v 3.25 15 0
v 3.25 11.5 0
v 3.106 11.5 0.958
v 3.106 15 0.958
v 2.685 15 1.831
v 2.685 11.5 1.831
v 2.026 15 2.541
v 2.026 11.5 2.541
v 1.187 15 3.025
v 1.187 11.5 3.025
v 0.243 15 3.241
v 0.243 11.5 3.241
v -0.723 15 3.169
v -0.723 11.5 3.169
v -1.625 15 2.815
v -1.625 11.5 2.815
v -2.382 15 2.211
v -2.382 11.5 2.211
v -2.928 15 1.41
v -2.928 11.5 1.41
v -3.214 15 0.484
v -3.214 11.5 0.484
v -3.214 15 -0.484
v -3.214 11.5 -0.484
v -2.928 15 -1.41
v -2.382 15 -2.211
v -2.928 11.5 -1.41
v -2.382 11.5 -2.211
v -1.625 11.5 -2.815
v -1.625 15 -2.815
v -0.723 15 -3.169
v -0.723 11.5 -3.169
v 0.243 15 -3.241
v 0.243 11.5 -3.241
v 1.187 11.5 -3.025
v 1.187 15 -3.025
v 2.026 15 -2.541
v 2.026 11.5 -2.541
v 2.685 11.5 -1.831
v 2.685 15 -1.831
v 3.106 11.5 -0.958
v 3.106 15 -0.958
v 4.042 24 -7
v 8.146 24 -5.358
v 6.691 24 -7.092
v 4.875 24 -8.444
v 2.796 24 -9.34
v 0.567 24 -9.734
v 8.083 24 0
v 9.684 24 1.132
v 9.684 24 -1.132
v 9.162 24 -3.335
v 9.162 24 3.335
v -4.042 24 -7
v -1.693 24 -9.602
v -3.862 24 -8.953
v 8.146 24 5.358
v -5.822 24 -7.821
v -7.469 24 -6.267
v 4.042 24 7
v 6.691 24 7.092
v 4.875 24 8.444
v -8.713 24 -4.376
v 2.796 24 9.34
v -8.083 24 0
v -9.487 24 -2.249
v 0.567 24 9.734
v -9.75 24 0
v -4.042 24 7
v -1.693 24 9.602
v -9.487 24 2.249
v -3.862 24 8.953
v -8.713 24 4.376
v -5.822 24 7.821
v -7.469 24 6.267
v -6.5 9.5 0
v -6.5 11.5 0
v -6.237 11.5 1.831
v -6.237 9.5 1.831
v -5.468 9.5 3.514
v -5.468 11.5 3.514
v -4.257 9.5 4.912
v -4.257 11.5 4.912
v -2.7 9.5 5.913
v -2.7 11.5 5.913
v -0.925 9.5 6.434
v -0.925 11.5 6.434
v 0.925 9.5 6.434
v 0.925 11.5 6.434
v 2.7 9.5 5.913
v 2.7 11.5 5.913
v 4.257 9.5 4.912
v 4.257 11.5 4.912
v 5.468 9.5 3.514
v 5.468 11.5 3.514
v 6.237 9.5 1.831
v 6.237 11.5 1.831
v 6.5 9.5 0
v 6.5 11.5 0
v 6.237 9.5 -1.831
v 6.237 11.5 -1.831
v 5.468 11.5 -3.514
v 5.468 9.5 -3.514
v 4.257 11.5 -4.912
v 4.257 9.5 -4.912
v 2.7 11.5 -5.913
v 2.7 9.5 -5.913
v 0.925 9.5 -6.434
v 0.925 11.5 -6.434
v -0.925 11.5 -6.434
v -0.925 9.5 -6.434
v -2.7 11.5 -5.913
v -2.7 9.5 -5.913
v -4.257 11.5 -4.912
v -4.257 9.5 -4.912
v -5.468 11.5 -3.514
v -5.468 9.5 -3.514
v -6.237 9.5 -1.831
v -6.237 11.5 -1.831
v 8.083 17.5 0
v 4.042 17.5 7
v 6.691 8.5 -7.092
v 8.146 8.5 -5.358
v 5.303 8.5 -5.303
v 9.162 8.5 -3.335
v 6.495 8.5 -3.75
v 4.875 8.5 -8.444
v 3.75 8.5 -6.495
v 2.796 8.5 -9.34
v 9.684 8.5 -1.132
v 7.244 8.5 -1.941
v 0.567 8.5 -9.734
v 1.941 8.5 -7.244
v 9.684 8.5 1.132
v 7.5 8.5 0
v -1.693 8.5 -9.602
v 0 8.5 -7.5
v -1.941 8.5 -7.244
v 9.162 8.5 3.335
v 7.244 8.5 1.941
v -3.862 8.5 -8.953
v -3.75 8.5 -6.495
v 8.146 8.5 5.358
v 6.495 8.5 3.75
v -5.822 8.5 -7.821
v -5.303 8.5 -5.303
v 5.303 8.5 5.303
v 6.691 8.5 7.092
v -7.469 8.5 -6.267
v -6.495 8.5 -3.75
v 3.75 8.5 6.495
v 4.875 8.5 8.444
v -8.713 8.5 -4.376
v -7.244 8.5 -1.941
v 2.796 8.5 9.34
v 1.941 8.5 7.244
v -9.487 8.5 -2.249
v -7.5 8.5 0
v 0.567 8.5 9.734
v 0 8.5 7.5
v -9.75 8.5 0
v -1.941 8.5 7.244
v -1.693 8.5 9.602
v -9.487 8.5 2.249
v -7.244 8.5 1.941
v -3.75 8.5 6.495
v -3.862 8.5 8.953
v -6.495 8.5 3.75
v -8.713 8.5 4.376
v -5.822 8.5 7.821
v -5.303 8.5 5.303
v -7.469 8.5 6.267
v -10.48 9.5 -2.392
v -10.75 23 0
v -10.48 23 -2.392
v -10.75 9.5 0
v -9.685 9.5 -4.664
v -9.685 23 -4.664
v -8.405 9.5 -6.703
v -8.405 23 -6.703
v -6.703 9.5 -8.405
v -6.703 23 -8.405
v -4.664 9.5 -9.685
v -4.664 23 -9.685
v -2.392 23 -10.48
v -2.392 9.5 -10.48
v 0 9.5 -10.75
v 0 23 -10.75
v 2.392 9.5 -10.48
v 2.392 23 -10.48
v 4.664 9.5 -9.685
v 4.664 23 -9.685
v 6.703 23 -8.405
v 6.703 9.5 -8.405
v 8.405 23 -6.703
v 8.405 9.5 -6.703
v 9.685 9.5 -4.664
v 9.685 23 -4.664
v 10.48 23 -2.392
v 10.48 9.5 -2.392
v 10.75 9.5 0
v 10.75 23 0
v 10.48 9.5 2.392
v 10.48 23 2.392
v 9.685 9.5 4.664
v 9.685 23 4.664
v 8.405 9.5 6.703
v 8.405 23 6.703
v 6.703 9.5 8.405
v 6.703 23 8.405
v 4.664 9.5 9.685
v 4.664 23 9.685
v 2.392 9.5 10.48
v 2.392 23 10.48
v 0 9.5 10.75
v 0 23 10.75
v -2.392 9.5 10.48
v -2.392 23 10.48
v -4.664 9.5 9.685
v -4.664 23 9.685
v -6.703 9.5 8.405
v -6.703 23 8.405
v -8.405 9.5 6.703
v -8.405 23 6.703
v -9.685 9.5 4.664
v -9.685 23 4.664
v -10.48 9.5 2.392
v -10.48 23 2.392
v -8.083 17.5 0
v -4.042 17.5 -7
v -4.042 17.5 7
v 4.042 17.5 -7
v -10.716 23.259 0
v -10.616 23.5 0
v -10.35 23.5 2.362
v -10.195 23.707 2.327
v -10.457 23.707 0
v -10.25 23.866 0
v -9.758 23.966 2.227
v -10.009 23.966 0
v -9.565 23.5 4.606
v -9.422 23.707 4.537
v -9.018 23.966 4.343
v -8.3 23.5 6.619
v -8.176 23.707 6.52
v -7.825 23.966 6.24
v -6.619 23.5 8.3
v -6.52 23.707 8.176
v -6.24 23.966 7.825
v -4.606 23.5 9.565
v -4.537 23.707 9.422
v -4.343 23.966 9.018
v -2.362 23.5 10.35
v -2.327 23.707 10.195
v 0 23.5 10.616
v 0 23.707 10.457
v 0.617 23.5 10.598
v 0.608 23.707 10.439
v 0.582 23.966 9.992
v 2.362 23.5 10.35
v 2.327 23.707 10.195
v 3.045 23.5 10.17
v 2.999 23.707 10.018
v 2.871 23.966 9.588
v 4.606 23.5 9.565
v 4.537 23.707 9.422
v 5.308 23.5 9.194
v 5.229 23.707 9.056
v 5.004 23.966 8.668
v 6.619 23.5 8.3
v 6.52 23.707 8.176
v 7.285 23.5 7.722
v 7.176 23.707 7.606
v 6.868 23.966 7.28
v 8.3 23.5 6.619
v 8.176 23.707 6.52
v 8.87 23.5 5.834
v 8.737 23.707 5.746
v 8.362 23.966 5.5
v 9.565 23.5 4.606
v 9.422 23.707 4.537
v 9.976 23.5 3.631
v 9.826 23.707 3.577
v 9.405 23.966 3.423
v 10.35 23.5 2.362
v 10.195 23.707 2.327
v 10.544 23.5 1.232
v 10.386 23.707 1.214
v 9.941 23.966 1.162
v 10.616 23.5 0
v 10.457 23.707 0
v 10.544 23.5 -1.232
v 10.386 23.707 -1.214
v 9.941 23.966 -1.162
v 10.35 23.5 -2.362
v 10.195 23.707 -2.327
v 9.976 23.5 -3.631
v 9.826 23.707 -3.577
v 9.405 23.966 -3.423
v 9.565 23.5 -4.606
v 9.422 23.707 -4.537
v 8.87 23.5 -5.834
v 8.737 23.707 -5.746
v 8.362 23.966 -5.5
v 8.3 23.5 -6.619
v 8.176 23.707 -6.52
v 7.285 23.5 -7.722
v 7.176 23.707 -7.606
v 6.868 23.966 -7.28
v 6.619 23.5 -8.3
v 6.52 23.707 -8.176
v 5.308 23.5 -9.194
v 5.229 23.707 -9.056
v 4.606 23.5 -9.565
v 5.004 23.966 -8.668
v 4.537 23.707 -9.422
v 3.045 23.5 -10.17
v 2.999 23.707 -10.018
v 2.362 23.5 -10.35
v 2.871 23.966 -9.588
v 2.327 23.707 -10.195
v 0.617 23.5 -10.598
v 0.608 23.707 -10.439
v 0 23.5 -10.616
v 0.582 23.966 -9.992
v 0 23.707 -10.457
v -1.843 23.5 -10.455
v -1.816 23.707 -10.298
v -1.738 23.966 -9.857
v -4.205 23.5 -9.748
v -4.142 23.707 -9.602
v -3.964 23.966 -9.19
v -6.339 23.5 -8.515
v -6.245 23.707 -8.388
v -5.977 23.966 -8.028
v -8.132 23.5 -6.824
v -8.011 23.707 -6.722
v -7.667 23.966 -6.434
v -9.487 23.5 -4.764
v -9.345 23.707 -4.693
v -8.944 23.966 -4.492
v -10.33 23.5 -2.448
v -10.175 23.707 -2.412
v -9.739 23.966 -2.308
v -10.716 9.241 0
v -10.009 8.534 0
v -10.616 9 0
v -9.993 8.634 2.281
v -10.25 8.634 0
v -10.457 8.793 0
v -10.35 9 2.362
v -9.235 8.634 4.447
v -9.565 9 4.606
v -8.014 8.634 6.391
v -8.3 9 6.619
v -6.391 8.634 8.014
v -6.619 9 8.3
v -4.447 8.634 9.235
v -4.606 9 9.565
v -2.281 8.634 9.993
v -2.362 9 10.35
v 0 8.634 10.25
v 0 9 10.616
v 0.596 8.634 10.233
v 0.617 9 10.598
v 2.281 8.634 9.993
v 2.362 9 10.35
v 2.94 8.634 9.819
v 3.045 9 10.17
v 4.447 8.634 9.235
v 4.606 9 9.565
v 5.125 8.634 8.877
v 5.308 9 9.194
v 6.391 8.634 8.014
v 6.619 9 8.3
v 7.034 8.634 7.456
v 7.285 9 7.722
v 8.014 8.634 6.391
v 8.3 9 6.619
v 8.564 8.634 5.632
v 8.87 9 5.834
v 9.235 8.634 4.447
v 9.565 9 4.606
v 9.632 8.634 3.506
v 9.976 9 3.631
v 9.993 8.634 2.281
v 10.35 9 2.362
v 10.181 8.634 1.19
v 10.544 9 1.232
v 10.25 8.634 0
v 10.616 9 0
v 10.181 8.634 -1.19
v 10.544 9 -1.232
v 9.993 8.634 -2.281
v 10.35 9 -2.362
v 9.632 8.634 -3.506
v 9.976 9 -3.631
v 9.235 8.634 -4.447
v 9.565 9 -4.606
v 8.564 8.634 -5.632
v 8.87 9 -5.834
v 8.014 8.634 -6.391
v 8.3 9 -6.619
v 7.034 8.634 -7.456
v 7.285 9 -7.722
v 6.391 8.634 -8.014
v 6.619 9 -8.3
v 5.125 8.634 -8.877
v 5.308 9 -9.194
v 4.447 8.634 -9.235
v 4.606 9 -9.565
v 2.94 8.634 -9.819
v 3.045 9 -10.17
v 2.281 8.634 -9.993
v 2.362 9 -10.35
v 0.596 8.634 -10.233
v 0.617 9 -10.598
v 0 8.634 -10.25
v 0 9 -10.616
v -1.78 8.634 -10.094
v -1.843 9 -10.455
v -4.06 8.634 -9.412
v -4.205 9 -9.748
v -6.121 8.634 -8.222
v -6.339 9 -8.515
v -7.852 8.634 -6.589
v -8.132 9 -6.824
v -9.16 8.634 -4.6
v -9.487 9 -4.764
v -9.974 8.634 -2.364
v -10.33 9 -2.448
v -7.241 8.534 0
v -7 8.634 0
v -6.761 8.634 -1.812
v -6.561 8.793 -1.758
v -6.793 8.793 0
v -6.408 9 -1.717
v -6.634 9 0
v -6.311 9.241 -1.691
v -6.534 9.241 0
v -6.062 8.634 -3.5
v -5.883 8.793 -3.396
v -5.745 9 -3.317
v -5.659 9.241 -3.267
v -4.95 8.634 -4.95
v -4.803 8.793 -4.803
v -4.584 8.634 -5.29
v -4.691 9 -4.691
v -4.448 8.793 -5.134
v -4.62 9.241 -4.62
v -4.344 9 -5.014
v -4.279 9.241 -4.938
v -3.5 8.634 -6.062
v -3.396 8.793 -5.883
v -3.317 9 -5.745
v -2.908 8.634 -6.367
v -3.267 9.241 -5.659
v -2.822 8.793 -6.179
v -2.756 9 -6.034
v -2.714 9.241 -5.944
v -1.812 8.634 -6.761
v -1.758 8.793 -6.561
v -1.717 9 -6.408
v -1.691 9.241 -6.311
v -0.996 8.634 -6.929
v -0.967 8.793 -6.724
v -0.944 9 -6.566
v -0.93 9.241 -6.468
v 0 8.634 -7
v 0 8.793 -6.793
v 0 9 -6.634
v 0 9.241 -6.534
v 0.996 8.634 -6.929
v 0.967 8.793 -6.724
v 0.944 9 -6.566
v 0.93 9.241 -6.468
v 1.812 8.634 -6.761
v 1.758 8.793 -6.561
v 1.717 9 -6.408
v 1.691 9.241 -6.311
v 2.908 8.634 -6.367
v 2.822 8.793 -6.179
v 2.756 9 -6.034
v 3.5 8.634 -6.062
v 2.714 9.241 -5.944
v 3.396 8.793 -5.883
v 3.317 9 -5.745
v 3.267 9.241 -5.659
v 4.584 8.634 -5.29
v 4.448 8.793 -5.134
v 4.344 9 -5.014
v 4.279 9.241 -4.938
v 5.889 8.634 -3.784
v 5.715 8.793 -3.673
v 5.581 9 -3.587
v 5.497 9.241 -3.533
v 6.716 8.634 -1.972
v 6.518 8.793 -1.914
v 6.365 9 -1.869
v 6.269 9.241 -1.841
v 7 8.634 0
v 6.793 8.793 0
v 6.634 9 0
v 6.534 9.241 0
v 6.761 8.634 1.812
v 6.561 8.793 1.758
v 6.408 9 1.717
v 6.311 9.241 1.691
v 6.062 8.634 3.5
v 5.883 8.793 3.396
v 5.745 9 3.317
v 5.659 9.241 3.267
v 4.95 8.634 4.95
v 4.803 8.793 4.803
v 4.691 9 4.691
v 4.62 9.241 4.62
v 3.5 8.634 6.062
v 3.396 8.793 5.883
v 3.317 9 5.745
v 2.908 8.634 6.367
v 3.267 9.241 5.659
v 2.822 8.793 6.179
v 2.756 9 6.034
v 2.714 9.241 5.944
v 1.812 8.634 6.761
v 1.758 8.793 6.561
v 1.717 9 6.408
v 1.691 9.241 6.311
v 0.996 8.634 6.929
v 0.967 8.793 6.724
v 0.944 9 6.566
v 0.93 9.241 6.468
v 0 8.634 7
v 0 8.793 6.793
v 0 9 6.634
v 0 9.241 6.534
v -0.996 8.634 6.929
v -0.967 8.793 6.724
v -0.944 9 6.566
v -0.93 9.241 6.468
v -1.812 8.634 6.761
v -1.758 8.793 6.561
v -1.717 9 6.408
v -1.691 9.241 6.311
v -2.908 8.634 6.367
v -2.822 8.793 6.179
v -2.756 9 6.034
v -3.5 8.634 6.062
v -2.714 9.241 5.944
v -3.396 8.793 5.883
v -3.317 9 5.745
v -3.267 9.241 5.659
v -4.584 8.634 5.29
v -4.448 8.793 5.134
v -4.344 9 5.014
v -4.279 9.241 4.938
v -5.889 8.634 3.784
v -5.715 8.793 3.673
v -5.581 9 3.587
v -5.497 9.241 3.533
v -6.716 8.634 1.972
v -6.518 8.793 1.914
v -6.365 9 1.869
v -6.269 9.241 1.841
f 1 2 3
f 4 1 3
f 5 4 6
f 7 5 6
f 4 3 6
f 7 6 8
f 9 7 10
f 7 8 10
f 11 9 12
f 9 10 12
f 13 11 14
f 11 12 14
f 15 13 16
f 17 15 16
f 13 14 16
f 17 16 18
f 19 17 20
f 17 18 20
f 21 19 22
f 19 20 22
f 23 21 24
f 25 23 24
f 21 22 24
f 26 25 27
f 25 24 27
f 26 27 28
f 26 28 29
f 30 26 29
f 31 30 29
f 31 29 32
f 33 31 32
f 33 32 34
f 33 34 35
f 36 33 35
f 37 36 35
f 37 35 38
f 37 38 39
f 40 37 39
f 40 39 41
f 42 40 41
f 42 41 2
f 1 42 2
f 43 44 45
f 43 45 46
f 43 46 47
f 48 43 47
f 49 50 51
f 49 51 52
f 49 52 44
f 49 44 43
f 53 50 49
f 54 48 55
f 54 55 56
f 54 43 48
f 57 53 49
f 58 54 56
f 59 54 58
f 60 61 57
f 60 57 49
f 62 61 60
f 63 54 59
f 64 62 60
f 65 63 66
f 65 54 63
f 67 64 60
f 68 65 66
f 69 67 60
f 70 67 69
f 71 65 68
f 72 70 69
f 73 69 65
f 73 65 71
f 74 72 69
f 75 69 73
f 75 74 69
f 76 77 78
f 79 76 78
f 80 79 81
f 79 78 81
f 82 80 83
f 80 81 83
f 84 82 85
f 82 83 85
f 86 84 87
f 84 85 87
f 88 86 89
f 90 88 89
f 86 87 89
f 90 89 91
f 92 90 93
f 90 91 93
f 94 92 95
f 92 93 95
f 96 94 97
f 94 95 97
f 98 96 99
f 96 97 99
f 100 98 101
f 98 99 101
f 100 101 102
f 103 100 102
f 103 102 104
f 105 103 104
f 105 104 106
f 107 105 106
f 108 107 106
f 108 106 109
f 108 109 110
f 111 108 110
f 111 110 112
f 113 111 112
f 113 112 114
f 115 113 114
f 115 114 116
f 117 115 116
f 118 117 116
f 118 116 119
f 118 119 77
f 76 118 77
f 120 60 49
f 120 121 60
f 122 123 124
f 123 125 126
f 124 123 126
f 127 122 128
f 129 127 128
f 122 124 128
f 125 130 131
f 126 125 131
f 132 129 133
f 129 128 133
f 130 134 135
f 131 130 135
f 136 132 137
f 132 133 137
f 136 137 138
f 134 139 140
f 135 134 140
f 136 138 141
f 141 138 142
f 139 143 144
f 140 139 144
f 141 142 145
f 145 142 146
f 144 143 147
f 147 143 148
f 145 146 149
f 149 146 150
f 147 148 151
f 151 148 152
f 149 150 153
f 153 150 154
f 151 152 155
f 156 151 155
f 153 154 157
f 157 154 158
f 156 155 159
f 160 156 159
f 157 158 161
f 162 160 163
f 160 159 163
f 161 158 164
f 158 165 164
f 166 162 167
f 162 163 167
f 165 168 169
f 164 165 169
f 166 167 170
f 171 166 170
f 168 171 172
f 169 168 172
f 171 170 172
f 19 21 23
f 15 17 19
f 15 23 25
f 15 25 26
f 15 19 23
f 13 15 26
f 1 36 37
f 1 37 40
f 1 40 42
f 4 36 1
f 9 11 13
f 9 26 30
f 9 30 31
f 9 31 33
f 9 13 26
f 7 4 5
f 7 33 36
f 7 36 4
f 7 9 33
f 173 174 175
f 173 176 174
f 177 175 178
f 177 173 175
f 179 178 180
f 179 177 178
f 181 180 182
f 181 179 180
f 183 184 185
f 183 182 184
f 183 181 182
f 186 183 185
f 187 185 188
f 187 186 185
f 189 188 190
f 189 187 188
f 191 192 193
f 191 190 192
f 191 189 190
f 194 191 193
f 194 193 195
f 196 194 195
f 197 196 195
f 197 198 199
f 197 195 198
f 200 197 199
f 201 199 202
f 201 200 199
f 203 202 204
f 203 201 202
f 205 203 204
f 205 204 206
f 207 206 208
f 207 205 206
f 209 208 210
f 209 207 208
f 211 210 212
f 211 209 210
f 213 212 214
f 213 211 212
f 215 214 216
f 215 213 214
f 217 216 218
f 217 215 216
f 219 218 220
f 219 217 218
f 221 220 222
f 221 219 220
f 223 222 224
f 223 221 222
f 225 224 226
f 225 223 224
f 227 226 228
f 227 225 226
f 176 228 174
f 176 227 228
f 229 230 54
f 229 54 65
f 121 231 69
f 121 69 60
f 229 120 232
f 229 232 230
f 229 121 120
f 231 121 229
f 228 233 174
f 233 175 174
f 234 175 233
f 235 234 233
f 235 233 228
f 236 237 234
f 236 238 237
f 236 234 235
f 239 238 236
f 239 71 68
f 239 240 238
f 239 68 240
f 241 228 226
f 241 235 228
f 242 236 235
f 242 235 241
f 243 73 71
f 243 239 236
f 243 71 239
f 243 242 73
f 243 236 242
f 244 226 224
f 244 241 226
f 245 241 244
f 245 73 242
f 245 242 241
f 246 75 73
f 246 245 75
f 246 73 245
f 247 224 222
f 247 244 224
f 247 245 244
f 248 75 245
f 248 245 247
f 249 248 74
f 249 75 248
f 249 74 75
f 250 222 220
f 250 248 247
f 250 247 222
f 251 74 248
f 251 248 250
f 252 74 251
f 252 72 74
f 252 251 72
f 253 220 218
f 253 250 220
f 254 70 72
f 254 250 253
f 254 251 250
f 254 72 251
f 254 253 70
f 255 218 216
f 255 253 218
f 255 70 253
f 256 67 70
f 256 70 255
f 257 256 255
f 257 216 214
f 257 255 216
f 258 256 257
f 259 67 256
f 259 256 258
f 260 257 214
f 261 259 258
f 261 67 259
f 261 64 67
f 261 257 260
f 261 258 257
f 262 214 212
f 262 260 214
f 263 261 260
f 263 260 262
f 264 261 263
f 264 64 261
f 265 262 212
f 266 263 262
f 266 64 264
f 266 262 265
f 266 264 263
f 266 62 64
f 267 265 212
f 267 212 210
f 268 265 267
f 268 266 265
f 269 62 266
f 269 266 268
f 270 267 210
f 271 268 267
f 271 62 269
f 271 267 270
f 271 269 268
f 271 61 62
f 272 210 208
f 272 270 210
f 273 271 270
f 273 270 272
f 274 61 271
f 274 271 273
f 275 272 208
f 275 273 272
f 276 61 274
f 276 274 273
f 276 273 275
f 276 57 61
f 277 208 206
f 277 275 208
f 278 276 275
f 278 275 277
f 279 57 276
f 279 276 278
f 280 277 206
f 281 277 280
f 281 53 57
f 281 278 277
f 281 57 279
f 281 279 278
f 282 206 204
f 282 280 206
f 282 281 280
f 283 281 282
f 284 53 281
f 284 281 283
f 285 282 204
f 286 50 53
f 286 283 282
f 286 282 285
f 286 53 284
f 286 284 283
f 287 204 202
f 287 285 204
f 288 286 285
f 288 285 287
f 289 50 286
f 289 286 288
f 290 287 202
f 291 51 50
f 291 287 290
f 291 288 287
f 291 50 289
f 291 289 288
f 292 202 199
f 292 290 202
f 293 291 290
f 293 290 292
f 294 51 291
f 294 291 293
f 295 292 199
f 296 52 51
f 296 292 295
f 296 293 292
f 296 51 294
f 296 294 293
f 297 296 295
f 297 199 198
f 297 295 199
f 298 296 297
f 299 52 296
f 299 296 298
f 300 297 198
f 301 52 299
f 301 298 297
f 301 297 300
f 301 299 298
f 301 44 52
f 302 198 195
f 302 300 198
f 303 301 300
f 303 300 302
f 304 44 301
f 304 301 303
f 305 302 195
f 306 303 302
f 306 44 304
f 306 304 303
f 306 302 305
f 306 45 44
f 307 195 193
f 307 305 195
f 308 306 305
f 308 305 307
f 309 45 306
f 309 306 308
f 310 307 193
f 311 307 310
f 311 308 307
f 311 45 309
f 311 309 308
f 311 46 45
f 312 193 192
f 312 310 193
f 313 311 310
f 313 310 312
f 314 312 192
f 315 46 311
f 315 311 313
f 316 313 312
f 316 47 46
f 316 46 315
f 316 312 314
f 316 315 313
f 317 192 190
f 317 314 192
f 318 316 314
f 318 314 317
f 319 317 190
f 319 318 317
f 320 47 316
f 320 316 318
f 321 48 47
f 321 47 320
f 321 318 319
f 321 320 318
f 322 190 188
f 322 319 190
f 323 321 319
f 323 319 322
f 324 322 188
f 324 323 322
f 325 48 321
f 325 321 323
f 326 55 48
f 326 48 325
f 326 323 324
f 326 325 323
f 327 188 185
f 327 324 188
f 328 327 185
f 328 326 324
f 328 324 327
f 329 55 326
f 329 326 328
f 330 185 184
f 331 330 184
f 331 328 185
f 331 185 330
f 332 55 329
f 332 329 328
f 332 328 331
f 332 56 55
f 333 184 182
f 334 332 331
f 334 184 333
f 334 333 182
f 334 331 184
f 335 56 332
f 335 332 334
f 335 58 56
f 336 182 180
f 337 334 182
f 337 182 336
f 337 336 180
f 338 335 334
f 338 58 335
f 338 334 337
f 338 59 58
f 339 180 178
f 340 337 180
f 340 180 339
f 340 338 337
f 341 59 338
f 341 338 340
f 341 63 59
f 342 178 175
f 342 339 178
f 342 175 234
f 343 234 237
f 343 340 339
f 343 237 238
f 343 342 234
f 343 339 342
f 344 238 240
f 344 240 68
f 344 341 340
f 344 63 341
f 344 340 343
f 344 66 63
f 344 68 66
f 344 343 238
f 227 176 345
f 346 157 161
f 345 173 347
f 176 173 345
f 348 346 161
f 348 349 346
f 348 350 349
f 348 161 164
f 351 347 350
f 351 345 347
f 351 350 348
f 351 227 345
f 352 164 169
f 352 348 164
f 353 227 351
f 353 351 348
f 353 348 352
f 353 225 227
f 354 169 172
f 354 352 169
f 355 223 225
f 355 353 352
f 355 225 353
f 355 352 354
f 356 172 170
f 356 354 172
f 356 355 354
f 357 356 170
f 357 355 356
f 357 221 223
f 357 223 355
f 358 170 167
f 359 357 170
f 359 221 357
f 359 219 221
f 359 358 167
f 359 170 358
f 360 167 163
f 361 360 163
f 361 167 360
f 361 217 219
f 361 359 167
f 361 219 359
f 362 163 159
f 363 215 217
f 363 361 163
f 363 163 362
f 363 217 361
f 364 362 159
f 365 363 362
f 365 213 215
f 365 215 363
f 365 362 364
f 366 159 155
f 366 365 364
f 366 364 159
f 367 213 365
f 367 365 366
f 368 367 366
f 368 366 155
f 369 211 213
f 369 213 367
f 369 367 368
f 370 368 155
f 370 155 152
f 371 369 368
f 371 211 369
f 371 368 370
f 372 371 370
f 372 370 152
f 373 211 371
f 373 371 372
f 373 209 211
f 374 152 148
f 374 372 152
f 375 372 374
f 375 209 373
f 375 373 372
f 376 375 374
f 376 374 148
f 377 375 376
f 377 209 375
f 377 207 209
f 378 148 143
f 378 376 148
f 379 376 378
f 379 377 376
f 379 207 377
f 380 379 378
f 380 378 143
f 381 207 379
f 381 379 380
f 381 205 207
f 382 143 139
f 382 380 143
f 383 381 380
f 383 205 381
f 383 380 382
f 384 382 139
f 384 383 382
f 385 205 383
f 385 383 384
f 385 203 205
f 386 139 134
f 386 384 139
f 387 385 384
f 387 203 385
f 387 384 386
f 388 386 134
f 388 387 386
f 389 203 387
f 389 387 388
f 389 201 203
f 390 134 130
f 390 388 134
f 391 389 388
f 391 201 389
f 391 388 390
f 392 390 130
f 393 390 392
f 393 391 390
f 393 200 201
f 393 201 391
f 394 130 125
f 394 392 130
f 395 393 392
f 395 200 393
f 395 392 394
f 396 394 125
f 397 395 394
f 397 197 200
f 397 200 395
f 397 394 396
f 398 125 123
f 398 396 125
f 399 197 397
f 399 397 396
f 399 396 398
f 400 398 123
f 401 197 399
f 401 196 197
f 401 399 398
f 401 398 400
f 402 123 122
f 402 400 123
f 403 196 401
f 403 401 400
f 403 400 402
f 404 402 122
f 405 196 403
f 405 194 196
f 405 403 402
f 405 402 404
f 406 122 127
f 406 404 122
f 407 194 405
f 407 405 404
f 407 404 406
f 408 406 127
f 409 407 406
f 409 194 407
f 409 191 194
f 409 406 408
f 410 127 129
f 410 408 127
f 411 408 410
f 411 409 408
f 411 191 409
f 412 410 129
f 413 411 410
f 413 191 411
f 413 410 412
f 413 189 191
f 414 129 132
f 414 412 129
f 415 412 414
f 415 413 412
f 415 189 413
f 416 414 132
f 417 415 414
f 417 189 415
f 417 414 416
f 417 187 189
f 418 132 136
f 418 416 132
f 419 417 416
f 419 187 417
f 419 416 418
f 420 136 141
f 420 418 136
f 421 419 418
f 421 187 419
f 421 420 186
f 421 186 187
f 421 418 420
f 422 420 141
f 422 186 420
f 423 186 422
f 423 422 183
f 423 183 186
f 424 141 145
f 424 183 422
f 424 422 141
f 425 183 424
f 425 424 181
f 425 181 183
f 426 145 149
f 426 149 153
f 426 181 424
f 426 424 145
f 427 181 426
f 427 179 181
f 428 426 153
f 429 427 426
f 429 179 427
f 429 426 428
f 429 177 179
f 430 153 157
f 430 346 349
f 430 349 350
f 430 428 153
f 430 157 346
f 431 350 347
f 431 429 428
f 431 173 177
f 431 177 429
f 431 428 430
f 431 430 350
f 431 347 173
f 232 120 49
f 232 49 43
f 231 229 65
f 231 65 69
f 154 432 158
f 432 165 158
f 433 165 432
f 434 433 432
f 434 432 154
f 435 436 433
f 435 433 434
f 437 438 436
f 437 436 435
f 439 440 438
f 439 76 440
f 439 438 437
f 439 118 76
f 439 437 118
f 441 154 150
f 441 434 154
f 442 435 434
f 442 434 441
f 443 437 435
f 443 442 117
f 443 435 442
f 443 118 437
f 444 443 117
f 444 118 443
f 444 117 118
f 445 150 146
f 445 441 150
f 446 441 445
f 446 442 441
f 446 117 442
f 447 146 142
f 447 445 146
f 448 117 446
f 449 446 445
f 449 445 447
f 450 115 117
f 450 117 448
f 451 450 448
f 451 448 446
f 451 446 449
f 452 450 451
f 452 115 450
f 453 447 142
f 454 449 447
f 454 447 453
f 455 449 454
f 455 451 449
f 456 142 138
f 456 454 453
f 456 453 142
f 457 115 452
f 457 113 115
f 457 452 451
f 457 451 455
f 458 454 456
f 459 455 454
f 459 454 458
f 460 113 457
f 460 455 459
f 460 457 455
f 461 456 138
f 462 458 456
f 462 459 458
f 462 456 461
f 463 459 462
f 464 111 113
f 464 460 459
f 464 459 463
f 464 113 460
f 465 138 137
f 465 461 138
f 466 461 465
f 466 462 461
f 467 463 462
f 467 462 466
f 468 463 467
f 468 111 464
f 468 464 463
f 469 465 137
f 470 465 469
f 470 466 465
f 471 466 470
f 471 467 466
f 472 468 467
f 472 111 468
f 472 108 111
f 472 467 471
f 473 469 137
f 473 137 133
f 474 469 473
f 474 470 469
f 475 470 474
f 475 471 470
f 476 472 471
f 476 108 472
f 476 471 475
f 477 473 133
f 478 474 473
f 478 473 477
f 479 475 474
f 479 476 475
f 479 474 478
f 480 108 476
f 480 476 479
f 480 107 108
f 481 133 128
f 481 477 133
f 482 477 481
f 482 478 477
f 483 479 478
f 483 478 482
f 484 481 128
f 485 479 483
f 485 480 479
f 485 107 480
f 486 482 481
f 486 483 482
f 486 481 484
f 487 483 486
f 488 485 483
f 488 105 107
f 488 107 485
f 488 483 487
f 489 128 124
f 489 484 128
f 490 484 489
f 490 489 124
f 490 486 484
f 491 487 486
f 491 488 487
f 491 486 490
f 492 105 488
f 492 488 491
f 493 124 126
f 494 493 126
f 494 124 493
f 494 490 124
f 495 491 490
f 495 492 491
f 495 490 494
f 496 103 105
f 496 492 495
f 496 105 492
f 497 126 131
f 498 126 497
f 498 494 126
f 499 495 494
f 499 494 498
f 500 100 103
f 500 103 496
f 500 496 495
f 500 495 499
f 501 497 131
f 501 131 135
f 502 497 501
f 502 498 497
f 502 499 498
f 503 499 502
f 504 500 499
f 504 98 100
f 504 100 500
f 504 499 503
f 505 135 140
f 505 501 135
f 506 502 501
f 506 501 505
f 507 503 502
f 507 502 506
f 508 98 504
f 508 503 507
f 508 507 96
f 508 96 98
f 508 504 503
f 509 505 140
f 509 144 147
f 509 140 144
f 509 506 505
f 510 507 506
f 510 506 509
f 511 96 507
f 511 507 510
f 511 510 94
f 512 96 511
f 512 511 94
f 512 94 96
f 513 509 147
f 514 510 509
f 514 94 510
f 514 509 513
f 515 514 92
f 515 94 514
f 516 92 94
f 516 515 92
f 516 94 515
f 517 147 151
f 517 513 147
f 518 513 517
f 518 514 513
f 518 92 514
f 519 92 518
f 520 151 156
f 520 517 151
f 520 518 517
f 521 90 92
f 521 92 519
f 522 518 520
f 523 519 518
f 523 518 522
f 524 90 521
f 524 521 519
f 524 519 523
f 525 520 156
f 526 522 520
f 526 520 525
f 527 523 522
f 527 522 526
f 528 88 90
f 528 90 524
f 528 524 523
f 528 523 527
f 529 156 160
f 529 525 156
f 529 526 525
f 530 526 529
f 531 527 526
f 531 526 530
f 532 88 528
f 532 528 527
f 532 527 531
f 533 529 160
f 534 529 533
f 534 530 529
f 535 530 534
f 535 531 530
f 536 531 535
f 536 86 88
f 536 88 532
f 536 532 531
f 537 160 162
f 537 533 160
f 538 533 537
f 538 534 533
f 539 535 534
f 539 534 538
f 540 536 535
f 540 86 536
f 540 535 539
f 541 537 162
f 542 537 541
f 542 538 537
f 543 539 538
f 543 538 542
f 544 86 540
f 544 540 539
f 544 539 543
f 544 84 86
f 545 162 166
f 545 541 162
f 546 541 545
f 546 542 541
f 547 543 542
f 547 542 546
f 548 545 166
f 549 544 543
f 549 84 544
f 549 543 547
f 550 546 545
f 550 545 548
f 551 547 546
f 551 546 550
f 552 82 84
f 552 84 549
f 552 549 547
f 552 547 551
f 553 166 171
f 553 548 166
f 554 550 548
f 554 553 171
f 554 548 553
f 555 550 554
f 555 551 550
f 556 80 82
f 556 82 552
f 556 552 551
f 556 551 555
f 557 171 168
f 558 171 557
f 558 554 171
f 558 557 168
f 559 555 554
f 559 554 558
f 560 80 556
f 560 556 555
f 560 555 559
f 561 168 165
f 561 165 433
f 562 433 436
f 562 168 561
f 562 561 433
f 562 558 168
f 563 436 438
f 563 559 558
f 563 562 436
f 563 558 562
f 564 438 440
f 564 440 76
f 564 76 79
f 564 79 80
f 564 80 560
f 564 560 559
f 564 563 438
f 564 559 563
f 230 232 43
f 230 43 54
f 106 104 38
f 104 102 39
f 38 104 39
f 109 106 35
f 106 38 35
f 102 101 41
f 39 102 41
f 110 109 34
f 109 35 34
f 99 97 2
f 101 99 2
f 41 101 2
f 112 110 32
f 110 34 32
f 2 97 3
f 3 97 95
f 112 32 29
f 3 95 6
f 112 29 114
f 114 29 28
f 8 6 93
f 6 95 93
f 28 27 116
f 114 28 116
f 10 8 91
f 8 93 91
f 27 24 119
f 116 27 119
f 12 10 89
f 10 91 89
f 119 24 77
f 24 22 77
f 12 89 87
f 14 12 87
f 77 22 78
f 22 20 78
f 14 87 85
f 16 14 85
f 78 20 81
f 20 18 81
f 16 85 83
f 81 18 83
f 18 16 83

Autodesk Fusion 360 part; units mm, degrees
sketch "Sketch4" plane through (0, 11.5, 0) normal (0, 1, 0) x (-1, 0, 0) in component "Plunger"
  circle A0 centre (0, 0) radius 3.25
  circle A1 centre (0, 0) radius 6.5
  circle A2 centre (0, 0) radius 10.75
  dimension "d20" = 13
  dimension "d21" = 21.5
extrude "Extrude3" add sketch "Sketch4" against normal blind 3 contours A2 in component "Plunger"
sketch "Sketch5" plane through (0, 11.5, 0) normal (0, 1, 0) x (-1, 0, 0) in component "Plunger"
  circle A0 centre (0, 0) radius 6.5
  circle A1 centre (0, 0) radius 10.75
  circle A2 centre (0, 0) radius 9.15
extrude "Extrude4" add sketch "Sketch5" along normal blind 6 contours A0 | A1 | A2 in component "Plunger"
sketch "Sketch1" plane through (0, 11.5, 0) normal (0, -1, 0) x (1, 0, 0)
  circle A0 centre (0, 0) radius 6.5
  circle A1 centre (0, 0) radius 3.25
  dimension "d29" = 6.5
extrude "Extrude6" cut sketch "Sketch1" against normal blind 3.5 contours A1 in component "Plunger"
sketch "Sketch7" plane through (0, 17.5, 0) normal (0, 1, 0) x (-1, 0, 0) in component "Plunger"
  circle A0 centre (0, 0) radius 10.75
  line L0 (4.0415, -7) -> (8.0829, 0)
  line L1 (8.0829, 0) -> (4.0415, 7)
  line L2 (4.0415, 7) -> (-4.0415, 7)
  line L3 (-4.0415, 7) -> (-8.0829, 0)
  line L4 (-8.0829, 0) -> (-4.0415, -7)
  line L5 (-4.0415, -7) -> (4.0415, -7)
  dimension "d32" = 7
extrude "Extrude7" add sketch "Sketch7" along normal blind 6.5 in component "Plunger"
fillet "Fillet1" radius 1 1 edges at (6.0601, 8.5, -2.3505) in component "Plunger"
fillet "Fillet2" radius 1 1 edges at (10.0225, 8.5, 3.8874) in component "Plunger"
fillet "Fillet3" radius 1 1 edges at (10.0225, 24, -3.8874) in component "Plunger"
component "Plunger" placed x (1, 0, 0) y (0, 1, 0) z (0, 0, 1) at (0, 0, 0)
